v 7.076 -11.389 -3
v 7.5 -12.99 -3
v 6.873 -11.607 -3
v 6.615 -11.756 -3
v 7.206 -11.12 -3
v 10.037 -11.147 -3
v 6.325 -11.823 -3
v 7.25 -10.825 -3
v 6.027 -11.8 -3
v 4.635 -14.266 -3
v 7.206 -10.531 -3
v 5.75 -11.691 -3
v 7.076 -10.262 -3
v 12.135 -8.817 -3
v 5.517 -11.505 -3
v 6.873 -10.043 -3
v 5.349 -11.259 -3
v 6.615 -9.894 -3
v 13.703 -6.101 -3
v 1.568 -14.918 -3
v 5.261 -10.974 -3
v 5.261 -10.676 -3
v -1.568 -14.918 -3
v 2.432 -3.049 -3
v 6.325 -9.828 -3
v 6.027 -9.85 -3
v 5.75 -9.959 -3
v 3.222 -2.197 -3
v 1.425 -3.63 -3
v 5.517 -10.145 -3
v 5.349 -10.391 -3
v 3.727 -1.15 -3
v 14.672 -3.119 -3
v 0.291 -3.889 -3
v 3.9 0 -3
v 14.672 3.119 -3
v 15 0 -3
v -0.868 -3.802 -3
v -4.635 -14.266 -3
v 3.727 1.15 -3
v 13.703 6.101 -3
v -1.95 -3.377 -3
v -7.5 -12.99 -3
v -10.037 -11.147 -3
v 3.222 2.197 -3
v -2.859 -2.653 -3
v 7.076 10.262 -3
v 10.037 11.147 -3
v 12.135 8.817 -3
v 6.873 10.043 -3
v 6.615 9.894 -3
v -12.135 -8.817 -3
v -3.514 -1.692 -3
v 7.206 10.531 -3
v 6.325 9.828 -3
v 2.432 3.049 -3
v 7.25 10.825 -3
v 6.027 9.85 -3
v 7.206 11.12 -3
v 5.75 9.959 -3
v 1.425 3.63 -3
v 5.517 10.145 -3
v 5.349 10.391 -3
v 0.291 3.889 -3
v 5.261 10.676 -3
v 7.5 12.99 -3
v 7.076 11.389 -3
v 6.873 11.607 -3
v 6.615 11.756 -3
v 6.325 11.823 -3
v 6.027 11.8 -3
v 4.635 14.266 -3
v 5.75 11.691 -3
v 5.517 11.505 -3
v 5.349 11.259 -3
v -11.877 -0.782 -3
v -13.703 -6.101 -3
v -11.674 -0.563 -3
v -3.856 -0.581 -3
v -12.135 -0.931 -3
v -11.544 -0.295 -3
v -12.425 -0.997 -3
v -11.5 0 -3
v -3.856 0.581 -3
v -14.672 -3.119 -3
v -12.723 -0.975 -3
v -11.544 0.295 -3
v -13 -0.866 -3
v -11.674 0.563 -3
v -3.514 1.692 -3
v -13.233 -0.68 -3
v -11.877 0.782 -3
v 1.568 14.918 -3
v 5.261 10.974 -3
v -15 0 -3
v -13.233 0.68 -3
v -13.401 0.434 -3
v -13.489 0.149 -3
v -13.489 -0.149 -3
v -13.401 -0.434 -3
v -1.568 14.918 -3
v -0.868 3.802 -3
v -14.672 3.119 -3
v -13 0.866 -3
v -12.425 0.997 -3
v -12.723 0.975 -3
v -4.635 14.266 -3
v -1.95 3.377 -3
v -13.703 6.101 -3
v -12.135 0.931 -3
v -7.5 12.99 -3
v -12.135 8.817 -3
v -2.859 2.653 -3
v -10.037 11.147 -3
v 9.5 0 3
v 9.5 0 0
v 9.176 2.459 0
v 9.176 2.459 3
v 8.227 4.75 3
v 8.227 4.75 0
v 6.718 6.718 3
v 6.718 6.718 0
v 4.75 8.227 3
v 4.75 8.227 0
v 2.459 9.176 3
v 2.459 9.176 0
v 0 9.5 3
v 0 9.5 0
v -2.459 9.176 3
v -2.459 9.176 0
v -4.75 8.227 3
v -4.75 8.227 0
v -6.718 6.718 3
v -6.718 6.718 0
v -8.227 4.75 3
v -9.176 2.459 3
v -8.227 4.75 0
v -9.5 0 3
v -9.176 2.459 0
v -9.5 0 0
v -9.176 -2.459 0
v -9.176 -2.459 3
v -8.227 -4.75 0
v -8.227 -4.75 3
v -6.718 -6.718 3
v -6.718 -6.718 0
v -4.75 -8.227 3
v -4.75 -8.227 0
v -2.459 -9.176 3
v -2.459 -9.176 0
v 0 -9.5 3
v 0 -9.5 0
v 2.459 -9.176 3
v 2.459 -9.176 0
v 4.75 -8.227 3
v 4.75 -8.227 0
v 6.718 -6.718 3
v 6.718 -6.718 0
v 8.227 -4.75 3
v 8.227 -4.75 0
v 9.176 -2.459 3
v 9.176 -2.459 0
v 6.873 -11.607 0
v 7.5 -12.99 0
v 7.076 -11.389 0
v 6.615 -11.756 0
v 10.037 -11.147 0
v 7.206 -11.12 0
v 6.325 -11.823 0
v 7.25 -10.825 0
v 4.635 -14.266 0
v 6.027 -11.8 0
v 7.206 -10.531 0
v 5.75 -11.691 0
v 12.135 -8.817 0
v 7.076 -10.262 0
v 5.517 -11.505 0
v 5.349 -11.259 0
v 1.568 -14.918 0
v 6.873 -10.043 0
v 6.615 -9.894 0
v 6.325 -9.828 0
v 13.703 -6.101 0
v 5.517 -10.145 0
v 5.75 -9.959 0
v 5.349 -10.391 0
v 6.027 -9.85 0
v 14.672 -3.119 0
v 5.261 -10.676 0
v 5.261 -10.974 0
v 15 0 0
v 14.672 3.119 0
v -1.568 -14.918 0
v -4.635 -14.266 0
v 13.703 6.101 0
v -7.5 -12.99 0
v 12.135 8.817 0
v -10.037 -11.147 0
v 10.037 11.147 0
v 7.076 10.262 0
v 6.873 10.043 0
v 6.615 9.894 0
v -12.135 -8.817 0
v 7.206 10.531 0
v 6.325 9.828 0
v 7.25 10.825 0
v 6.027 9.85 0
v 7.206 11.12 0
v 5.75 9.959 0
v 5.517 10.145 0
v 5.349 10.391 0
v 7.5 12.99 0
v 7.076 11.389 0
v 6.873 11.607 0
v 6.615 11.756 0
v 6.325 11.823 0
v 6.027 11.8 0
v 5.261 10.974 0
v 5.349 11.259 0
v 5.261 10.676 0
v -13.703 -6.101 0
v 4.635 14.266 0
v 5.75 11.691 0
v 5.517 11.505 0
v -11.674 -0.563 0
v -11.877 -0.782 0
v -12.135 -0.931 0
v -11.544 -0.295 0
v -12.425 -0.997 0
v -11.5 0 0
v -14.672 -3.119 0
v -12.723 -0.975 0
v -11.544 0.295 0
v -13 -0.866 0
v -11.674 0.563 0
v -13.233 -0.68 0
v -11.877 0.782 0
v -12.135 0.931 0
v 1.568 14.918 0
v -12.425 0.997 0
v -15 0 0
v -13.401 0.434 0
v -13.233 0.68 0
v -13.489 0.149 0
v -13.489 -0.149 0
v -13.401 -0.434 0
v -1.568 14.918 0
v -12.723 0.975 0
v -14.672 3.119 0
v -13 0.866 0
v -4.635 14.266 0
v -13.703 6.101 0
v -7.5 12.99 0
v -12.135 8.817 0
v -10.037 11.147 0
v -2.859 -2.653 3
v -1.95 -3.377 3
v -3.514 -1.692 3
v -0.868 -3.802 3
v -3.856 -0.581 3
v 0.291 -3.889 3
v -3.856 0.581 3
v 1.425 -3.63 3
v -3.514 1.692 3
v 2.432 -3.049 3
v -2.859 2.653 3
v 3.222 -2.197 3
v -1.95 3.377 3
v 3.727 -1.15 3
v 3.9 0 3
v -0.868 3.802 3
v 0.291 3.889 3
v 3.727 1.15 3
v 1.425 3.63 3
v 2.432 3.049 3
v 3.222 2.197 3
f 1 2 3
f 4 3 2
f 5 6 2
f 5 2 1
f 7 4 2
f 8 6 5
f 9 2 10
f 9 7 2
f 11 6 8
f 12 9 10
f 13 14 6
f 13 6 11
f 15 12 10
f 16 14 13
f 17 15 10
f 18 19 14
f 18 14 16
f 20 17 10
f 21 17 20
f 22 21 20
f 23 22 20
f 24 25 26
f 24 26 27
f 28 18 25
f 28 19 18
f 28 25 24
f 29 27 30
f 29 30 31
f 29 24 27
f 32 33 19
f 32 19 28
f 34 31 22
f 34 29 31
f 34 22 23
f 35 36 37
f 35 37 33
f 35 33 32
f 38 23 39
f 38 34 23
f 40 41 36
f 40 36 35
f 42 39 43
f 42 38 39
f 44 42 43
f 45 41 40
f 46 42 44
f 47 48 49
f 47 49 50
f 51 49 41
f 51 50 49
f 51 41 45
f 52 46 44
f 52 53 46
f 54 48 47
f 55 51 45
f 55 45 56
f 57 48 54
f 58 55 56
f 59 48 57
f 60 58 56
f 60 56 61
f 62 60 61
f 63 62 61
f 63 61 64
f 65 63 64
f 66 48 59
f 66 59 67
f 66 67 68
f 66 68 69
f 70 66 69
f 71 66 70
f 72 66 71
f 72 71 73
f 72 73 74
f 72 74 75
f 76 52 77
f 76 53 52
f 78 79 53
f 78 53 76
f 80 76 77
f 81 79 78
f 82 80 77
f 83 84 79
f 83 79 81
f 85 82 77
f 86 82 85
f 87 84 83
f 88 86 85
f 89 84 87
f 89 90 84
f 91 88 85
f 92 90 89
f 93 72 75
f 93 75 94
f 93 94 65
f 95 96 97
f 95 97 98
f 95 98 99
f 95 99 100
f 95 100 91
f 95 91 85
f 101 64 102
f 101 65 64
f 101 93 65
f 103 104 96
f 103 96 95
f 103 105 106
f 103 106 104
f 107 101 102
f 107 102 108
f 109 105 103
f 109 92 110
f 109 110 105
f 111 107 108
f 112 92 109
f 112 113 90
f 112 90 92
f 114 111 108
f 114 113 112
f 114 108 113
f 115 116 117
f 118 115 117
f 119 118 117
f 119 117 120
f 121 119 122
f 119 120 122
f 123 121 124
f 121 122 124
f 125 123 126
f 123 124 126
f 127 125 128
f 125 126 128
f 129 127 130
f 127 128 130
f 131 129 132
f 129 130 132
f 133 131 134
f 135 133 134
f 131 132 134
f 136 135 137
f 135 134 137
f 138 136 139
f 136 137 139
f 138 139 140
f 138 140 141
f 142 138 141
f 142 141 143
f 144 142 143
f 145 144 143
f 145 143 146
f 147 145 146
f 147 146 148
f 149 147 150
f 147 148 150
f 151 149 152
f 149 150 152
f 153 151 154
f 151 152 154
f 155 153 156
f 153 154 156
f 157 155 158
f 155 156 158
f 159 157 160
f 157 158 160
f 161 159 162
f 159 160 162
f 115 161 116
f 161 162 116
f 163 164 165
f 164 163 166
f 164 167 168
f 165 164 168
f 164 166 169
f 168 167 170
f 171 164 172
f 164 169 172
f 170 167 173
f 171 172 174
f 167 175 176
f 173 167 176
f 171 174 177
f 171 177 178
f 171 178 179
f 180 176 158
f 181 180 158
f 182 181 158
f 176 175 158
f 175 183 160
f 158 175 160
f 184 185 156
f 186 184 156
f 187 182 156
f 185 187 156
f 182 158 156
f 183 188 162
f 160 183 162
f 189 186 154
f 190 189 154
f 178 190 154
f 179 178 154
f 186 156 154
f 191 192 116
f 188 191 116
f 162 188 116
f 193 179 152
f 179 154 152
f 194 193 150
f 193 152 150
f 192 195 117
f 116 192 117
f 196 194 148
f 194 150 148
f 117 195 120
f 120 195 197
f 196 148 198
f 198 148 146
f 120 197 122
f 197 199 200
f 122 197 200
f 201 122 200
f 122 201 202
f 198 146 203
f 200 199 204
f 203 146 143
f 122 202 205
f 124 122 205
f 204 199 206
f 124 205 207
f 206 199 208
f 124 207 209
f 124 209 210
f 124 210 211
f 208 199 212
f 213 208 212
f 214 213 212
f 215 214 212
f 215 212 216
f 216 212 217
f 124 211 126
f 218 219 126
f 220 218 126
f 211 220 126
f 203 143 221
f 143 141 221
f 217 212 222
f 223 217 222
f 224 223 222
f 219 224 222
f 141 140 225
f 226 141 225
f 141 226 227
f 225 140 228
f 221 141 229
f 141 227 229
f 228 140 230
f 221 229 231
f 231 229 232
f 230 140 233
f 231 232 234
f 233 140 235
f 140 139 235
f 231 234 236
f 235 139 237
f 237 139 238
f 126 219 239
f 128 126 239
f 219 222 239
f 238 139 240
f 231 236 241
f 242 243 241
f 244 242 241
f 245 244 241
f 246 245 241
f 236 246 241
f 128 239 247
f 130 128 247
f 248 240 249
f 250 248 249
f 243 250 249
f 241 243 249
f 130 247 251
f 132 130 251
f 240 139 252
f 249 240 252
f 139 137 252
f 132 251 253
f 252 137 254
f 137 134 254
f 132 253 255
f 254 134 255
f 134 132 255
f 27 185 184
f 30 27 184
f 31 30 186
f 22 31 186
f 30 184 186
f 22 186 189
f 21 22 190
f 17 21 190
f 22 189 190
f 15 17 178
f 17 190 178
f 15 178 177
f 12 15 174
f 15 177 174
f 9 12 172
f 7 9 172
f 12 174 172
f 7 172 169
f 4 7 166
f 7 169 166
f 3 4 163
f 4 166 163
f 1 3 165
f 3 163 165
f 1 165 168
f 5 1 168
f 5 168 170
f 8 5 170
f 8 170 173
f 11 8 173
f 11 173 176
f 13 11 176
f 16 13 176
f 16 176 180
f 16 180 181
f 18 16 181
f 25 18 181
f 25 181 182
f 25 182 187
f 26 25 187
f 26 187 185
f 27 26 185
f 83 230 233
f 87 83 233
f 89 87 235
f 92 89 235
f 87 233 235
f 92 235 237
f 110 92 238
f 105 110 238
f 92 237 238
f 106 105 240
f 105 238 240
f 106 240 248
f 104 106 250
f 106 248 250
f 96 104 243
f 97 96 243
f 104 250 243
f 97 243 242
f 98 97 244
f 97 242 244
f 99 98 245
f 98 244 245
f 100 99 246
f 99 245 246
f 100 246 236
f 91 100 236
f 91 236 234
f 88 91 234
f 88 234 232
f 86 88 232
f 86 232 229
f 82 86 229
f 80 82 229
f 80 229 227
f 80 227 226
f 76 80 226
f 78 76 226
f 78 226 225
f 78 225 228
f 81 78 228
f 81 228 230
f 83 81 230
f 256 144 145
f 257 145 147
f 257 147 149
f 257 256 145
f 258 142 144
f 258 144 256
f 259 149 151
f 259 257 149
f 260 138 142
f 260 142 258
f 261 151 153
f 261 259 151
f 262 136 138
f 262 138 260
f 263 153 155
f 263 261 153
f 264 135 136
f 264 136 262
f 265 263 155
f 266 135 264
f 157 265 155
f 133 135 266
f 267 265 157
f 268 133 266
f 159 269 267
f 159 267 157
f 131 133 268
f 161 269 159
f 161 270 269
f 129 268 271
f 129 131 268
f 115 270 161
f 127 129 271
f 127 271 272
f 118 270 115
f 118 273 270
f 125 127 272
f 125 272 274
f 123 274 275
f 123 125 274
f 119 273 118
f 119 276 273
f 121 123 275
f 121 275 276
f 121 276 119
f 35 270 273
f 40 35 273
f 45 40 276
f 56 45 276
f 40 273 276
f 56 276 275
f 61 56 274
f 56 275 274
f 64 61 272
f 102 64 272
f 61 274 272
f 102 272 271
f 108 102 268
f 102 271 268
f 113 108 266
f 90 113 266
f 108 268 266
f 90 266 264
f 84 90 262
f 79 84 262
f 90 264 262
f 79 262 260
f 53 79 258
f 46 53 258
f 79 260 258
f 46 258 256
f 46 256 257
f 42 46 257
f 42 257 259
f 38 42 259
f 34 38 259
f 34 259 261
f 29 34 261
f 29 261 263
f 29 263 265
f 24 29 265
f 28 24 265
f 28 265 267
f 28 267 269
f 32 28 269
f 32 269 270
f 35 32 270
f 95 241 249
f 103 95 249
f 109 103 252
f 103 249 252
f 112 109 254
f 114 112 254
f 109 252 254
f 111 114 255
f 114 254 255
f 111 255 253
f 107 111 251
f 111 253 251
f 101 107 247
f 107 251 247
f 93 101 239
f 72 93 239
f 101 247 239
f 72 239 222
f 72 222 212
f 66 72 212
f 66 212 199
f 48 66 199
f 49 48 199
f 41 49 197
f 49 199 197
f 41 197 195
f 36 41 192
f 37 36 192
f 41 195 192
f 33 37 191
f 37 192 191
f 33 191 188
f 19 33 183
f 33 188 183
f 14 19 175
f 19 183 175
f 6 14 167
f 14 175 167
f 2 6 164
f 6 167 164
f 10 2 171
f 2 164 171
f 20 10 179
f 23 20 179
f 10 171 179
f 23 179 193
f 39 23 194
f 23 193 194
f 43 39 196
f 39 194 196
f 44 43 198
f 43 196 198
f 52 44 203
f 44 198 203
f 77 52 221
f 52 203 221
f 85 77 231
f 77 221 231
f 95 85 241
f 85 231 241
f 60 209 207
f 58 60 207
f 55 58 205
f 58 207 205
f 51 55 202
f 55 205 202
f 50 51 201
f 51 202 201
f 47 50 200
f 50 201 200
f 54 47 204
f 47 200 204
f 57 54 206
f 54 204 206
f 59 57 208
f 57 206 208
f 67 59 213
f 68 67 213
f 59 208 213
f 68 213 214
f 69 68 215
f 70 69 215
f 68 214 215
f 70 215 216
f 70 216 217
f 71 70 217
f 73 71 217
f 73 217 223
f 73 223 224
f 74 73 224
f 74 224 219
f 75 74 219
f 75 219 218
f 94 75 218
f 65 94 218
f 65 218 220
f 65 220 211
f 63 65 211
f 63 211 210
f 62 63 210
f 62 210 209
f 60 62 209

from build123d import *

# Parameters (mm, degrees)
SKETCH_1_R               = 9.5
EXTRUDE_1_DEPTH          = 3
SKETCH_2_R               = 15
EXTRUDE_2_DEPTH          = 3
SKETCH_3_R               = 3.9
CUT_EXTRUDE_3_DEPTH      = 23.045407685
SKETCH_4_R               = 1
CUT_EXTRUDE_4_DEPTH      = 22.424285286
PATTERN_CIRCULAR_1_COUNT = 3


with BuildPart() as part:
    # Эскиз1 → Бобышка-Вытянуть1 (new body)
    with BuildSketch(Plane.XY):
        Circle(SKETCH_1_R)
    extrude(amount=EXTRUDE_1_DEPTH)

    # Эскиз2 → Бобышка-Вытянуть2 (add)
    with BuildSketch(Plane(origin=(0, 0, 0), x_dir=(-1, 0, 0), z_dir=(0, 0, -1))):
        Circle(SKETCH_2_R)
    extrude(amount=EXTRUDE_2_DEPTH)

    # Эскиз3 → Вырез-Вытянуть3 (cut, through all)
    with BuildSketch(Plane.XY.offset(3)):
        Circle(SKETCH_3_R)
    extrude(amount=-CUT_EXTRUDE_3_DEPTH, mode=Mode.SUBTRACT)

    # Эскиз4 → Вырез-Вытянуть4 (cut, through all)
    with BuildSketch(Plane.XY):
        with Locations((-12.5, 0)):
            Circle(SKETCH_4_R)
    cut_extrude_4 = extrude(amount=-CUT_EXTRUDE_4_DEPTH, mode=Mode.SUBTRACT)

    # Круговой массив1: Вырез-Вытянуть4 ×3 about axis
    pattern_circular_1_axis = Axis((0, 0, 0), (0, 0, 1))
    for i in range(1, PATTERN_CIRCULAR_1_COUNT):
        add(cut_extrude_4.rotate(pattern_circular_1_axis, i * 360 / PATTERN_CIRCULAR_1_COUNT), mode=Mode.SUBTRACT)


solid = part.part
